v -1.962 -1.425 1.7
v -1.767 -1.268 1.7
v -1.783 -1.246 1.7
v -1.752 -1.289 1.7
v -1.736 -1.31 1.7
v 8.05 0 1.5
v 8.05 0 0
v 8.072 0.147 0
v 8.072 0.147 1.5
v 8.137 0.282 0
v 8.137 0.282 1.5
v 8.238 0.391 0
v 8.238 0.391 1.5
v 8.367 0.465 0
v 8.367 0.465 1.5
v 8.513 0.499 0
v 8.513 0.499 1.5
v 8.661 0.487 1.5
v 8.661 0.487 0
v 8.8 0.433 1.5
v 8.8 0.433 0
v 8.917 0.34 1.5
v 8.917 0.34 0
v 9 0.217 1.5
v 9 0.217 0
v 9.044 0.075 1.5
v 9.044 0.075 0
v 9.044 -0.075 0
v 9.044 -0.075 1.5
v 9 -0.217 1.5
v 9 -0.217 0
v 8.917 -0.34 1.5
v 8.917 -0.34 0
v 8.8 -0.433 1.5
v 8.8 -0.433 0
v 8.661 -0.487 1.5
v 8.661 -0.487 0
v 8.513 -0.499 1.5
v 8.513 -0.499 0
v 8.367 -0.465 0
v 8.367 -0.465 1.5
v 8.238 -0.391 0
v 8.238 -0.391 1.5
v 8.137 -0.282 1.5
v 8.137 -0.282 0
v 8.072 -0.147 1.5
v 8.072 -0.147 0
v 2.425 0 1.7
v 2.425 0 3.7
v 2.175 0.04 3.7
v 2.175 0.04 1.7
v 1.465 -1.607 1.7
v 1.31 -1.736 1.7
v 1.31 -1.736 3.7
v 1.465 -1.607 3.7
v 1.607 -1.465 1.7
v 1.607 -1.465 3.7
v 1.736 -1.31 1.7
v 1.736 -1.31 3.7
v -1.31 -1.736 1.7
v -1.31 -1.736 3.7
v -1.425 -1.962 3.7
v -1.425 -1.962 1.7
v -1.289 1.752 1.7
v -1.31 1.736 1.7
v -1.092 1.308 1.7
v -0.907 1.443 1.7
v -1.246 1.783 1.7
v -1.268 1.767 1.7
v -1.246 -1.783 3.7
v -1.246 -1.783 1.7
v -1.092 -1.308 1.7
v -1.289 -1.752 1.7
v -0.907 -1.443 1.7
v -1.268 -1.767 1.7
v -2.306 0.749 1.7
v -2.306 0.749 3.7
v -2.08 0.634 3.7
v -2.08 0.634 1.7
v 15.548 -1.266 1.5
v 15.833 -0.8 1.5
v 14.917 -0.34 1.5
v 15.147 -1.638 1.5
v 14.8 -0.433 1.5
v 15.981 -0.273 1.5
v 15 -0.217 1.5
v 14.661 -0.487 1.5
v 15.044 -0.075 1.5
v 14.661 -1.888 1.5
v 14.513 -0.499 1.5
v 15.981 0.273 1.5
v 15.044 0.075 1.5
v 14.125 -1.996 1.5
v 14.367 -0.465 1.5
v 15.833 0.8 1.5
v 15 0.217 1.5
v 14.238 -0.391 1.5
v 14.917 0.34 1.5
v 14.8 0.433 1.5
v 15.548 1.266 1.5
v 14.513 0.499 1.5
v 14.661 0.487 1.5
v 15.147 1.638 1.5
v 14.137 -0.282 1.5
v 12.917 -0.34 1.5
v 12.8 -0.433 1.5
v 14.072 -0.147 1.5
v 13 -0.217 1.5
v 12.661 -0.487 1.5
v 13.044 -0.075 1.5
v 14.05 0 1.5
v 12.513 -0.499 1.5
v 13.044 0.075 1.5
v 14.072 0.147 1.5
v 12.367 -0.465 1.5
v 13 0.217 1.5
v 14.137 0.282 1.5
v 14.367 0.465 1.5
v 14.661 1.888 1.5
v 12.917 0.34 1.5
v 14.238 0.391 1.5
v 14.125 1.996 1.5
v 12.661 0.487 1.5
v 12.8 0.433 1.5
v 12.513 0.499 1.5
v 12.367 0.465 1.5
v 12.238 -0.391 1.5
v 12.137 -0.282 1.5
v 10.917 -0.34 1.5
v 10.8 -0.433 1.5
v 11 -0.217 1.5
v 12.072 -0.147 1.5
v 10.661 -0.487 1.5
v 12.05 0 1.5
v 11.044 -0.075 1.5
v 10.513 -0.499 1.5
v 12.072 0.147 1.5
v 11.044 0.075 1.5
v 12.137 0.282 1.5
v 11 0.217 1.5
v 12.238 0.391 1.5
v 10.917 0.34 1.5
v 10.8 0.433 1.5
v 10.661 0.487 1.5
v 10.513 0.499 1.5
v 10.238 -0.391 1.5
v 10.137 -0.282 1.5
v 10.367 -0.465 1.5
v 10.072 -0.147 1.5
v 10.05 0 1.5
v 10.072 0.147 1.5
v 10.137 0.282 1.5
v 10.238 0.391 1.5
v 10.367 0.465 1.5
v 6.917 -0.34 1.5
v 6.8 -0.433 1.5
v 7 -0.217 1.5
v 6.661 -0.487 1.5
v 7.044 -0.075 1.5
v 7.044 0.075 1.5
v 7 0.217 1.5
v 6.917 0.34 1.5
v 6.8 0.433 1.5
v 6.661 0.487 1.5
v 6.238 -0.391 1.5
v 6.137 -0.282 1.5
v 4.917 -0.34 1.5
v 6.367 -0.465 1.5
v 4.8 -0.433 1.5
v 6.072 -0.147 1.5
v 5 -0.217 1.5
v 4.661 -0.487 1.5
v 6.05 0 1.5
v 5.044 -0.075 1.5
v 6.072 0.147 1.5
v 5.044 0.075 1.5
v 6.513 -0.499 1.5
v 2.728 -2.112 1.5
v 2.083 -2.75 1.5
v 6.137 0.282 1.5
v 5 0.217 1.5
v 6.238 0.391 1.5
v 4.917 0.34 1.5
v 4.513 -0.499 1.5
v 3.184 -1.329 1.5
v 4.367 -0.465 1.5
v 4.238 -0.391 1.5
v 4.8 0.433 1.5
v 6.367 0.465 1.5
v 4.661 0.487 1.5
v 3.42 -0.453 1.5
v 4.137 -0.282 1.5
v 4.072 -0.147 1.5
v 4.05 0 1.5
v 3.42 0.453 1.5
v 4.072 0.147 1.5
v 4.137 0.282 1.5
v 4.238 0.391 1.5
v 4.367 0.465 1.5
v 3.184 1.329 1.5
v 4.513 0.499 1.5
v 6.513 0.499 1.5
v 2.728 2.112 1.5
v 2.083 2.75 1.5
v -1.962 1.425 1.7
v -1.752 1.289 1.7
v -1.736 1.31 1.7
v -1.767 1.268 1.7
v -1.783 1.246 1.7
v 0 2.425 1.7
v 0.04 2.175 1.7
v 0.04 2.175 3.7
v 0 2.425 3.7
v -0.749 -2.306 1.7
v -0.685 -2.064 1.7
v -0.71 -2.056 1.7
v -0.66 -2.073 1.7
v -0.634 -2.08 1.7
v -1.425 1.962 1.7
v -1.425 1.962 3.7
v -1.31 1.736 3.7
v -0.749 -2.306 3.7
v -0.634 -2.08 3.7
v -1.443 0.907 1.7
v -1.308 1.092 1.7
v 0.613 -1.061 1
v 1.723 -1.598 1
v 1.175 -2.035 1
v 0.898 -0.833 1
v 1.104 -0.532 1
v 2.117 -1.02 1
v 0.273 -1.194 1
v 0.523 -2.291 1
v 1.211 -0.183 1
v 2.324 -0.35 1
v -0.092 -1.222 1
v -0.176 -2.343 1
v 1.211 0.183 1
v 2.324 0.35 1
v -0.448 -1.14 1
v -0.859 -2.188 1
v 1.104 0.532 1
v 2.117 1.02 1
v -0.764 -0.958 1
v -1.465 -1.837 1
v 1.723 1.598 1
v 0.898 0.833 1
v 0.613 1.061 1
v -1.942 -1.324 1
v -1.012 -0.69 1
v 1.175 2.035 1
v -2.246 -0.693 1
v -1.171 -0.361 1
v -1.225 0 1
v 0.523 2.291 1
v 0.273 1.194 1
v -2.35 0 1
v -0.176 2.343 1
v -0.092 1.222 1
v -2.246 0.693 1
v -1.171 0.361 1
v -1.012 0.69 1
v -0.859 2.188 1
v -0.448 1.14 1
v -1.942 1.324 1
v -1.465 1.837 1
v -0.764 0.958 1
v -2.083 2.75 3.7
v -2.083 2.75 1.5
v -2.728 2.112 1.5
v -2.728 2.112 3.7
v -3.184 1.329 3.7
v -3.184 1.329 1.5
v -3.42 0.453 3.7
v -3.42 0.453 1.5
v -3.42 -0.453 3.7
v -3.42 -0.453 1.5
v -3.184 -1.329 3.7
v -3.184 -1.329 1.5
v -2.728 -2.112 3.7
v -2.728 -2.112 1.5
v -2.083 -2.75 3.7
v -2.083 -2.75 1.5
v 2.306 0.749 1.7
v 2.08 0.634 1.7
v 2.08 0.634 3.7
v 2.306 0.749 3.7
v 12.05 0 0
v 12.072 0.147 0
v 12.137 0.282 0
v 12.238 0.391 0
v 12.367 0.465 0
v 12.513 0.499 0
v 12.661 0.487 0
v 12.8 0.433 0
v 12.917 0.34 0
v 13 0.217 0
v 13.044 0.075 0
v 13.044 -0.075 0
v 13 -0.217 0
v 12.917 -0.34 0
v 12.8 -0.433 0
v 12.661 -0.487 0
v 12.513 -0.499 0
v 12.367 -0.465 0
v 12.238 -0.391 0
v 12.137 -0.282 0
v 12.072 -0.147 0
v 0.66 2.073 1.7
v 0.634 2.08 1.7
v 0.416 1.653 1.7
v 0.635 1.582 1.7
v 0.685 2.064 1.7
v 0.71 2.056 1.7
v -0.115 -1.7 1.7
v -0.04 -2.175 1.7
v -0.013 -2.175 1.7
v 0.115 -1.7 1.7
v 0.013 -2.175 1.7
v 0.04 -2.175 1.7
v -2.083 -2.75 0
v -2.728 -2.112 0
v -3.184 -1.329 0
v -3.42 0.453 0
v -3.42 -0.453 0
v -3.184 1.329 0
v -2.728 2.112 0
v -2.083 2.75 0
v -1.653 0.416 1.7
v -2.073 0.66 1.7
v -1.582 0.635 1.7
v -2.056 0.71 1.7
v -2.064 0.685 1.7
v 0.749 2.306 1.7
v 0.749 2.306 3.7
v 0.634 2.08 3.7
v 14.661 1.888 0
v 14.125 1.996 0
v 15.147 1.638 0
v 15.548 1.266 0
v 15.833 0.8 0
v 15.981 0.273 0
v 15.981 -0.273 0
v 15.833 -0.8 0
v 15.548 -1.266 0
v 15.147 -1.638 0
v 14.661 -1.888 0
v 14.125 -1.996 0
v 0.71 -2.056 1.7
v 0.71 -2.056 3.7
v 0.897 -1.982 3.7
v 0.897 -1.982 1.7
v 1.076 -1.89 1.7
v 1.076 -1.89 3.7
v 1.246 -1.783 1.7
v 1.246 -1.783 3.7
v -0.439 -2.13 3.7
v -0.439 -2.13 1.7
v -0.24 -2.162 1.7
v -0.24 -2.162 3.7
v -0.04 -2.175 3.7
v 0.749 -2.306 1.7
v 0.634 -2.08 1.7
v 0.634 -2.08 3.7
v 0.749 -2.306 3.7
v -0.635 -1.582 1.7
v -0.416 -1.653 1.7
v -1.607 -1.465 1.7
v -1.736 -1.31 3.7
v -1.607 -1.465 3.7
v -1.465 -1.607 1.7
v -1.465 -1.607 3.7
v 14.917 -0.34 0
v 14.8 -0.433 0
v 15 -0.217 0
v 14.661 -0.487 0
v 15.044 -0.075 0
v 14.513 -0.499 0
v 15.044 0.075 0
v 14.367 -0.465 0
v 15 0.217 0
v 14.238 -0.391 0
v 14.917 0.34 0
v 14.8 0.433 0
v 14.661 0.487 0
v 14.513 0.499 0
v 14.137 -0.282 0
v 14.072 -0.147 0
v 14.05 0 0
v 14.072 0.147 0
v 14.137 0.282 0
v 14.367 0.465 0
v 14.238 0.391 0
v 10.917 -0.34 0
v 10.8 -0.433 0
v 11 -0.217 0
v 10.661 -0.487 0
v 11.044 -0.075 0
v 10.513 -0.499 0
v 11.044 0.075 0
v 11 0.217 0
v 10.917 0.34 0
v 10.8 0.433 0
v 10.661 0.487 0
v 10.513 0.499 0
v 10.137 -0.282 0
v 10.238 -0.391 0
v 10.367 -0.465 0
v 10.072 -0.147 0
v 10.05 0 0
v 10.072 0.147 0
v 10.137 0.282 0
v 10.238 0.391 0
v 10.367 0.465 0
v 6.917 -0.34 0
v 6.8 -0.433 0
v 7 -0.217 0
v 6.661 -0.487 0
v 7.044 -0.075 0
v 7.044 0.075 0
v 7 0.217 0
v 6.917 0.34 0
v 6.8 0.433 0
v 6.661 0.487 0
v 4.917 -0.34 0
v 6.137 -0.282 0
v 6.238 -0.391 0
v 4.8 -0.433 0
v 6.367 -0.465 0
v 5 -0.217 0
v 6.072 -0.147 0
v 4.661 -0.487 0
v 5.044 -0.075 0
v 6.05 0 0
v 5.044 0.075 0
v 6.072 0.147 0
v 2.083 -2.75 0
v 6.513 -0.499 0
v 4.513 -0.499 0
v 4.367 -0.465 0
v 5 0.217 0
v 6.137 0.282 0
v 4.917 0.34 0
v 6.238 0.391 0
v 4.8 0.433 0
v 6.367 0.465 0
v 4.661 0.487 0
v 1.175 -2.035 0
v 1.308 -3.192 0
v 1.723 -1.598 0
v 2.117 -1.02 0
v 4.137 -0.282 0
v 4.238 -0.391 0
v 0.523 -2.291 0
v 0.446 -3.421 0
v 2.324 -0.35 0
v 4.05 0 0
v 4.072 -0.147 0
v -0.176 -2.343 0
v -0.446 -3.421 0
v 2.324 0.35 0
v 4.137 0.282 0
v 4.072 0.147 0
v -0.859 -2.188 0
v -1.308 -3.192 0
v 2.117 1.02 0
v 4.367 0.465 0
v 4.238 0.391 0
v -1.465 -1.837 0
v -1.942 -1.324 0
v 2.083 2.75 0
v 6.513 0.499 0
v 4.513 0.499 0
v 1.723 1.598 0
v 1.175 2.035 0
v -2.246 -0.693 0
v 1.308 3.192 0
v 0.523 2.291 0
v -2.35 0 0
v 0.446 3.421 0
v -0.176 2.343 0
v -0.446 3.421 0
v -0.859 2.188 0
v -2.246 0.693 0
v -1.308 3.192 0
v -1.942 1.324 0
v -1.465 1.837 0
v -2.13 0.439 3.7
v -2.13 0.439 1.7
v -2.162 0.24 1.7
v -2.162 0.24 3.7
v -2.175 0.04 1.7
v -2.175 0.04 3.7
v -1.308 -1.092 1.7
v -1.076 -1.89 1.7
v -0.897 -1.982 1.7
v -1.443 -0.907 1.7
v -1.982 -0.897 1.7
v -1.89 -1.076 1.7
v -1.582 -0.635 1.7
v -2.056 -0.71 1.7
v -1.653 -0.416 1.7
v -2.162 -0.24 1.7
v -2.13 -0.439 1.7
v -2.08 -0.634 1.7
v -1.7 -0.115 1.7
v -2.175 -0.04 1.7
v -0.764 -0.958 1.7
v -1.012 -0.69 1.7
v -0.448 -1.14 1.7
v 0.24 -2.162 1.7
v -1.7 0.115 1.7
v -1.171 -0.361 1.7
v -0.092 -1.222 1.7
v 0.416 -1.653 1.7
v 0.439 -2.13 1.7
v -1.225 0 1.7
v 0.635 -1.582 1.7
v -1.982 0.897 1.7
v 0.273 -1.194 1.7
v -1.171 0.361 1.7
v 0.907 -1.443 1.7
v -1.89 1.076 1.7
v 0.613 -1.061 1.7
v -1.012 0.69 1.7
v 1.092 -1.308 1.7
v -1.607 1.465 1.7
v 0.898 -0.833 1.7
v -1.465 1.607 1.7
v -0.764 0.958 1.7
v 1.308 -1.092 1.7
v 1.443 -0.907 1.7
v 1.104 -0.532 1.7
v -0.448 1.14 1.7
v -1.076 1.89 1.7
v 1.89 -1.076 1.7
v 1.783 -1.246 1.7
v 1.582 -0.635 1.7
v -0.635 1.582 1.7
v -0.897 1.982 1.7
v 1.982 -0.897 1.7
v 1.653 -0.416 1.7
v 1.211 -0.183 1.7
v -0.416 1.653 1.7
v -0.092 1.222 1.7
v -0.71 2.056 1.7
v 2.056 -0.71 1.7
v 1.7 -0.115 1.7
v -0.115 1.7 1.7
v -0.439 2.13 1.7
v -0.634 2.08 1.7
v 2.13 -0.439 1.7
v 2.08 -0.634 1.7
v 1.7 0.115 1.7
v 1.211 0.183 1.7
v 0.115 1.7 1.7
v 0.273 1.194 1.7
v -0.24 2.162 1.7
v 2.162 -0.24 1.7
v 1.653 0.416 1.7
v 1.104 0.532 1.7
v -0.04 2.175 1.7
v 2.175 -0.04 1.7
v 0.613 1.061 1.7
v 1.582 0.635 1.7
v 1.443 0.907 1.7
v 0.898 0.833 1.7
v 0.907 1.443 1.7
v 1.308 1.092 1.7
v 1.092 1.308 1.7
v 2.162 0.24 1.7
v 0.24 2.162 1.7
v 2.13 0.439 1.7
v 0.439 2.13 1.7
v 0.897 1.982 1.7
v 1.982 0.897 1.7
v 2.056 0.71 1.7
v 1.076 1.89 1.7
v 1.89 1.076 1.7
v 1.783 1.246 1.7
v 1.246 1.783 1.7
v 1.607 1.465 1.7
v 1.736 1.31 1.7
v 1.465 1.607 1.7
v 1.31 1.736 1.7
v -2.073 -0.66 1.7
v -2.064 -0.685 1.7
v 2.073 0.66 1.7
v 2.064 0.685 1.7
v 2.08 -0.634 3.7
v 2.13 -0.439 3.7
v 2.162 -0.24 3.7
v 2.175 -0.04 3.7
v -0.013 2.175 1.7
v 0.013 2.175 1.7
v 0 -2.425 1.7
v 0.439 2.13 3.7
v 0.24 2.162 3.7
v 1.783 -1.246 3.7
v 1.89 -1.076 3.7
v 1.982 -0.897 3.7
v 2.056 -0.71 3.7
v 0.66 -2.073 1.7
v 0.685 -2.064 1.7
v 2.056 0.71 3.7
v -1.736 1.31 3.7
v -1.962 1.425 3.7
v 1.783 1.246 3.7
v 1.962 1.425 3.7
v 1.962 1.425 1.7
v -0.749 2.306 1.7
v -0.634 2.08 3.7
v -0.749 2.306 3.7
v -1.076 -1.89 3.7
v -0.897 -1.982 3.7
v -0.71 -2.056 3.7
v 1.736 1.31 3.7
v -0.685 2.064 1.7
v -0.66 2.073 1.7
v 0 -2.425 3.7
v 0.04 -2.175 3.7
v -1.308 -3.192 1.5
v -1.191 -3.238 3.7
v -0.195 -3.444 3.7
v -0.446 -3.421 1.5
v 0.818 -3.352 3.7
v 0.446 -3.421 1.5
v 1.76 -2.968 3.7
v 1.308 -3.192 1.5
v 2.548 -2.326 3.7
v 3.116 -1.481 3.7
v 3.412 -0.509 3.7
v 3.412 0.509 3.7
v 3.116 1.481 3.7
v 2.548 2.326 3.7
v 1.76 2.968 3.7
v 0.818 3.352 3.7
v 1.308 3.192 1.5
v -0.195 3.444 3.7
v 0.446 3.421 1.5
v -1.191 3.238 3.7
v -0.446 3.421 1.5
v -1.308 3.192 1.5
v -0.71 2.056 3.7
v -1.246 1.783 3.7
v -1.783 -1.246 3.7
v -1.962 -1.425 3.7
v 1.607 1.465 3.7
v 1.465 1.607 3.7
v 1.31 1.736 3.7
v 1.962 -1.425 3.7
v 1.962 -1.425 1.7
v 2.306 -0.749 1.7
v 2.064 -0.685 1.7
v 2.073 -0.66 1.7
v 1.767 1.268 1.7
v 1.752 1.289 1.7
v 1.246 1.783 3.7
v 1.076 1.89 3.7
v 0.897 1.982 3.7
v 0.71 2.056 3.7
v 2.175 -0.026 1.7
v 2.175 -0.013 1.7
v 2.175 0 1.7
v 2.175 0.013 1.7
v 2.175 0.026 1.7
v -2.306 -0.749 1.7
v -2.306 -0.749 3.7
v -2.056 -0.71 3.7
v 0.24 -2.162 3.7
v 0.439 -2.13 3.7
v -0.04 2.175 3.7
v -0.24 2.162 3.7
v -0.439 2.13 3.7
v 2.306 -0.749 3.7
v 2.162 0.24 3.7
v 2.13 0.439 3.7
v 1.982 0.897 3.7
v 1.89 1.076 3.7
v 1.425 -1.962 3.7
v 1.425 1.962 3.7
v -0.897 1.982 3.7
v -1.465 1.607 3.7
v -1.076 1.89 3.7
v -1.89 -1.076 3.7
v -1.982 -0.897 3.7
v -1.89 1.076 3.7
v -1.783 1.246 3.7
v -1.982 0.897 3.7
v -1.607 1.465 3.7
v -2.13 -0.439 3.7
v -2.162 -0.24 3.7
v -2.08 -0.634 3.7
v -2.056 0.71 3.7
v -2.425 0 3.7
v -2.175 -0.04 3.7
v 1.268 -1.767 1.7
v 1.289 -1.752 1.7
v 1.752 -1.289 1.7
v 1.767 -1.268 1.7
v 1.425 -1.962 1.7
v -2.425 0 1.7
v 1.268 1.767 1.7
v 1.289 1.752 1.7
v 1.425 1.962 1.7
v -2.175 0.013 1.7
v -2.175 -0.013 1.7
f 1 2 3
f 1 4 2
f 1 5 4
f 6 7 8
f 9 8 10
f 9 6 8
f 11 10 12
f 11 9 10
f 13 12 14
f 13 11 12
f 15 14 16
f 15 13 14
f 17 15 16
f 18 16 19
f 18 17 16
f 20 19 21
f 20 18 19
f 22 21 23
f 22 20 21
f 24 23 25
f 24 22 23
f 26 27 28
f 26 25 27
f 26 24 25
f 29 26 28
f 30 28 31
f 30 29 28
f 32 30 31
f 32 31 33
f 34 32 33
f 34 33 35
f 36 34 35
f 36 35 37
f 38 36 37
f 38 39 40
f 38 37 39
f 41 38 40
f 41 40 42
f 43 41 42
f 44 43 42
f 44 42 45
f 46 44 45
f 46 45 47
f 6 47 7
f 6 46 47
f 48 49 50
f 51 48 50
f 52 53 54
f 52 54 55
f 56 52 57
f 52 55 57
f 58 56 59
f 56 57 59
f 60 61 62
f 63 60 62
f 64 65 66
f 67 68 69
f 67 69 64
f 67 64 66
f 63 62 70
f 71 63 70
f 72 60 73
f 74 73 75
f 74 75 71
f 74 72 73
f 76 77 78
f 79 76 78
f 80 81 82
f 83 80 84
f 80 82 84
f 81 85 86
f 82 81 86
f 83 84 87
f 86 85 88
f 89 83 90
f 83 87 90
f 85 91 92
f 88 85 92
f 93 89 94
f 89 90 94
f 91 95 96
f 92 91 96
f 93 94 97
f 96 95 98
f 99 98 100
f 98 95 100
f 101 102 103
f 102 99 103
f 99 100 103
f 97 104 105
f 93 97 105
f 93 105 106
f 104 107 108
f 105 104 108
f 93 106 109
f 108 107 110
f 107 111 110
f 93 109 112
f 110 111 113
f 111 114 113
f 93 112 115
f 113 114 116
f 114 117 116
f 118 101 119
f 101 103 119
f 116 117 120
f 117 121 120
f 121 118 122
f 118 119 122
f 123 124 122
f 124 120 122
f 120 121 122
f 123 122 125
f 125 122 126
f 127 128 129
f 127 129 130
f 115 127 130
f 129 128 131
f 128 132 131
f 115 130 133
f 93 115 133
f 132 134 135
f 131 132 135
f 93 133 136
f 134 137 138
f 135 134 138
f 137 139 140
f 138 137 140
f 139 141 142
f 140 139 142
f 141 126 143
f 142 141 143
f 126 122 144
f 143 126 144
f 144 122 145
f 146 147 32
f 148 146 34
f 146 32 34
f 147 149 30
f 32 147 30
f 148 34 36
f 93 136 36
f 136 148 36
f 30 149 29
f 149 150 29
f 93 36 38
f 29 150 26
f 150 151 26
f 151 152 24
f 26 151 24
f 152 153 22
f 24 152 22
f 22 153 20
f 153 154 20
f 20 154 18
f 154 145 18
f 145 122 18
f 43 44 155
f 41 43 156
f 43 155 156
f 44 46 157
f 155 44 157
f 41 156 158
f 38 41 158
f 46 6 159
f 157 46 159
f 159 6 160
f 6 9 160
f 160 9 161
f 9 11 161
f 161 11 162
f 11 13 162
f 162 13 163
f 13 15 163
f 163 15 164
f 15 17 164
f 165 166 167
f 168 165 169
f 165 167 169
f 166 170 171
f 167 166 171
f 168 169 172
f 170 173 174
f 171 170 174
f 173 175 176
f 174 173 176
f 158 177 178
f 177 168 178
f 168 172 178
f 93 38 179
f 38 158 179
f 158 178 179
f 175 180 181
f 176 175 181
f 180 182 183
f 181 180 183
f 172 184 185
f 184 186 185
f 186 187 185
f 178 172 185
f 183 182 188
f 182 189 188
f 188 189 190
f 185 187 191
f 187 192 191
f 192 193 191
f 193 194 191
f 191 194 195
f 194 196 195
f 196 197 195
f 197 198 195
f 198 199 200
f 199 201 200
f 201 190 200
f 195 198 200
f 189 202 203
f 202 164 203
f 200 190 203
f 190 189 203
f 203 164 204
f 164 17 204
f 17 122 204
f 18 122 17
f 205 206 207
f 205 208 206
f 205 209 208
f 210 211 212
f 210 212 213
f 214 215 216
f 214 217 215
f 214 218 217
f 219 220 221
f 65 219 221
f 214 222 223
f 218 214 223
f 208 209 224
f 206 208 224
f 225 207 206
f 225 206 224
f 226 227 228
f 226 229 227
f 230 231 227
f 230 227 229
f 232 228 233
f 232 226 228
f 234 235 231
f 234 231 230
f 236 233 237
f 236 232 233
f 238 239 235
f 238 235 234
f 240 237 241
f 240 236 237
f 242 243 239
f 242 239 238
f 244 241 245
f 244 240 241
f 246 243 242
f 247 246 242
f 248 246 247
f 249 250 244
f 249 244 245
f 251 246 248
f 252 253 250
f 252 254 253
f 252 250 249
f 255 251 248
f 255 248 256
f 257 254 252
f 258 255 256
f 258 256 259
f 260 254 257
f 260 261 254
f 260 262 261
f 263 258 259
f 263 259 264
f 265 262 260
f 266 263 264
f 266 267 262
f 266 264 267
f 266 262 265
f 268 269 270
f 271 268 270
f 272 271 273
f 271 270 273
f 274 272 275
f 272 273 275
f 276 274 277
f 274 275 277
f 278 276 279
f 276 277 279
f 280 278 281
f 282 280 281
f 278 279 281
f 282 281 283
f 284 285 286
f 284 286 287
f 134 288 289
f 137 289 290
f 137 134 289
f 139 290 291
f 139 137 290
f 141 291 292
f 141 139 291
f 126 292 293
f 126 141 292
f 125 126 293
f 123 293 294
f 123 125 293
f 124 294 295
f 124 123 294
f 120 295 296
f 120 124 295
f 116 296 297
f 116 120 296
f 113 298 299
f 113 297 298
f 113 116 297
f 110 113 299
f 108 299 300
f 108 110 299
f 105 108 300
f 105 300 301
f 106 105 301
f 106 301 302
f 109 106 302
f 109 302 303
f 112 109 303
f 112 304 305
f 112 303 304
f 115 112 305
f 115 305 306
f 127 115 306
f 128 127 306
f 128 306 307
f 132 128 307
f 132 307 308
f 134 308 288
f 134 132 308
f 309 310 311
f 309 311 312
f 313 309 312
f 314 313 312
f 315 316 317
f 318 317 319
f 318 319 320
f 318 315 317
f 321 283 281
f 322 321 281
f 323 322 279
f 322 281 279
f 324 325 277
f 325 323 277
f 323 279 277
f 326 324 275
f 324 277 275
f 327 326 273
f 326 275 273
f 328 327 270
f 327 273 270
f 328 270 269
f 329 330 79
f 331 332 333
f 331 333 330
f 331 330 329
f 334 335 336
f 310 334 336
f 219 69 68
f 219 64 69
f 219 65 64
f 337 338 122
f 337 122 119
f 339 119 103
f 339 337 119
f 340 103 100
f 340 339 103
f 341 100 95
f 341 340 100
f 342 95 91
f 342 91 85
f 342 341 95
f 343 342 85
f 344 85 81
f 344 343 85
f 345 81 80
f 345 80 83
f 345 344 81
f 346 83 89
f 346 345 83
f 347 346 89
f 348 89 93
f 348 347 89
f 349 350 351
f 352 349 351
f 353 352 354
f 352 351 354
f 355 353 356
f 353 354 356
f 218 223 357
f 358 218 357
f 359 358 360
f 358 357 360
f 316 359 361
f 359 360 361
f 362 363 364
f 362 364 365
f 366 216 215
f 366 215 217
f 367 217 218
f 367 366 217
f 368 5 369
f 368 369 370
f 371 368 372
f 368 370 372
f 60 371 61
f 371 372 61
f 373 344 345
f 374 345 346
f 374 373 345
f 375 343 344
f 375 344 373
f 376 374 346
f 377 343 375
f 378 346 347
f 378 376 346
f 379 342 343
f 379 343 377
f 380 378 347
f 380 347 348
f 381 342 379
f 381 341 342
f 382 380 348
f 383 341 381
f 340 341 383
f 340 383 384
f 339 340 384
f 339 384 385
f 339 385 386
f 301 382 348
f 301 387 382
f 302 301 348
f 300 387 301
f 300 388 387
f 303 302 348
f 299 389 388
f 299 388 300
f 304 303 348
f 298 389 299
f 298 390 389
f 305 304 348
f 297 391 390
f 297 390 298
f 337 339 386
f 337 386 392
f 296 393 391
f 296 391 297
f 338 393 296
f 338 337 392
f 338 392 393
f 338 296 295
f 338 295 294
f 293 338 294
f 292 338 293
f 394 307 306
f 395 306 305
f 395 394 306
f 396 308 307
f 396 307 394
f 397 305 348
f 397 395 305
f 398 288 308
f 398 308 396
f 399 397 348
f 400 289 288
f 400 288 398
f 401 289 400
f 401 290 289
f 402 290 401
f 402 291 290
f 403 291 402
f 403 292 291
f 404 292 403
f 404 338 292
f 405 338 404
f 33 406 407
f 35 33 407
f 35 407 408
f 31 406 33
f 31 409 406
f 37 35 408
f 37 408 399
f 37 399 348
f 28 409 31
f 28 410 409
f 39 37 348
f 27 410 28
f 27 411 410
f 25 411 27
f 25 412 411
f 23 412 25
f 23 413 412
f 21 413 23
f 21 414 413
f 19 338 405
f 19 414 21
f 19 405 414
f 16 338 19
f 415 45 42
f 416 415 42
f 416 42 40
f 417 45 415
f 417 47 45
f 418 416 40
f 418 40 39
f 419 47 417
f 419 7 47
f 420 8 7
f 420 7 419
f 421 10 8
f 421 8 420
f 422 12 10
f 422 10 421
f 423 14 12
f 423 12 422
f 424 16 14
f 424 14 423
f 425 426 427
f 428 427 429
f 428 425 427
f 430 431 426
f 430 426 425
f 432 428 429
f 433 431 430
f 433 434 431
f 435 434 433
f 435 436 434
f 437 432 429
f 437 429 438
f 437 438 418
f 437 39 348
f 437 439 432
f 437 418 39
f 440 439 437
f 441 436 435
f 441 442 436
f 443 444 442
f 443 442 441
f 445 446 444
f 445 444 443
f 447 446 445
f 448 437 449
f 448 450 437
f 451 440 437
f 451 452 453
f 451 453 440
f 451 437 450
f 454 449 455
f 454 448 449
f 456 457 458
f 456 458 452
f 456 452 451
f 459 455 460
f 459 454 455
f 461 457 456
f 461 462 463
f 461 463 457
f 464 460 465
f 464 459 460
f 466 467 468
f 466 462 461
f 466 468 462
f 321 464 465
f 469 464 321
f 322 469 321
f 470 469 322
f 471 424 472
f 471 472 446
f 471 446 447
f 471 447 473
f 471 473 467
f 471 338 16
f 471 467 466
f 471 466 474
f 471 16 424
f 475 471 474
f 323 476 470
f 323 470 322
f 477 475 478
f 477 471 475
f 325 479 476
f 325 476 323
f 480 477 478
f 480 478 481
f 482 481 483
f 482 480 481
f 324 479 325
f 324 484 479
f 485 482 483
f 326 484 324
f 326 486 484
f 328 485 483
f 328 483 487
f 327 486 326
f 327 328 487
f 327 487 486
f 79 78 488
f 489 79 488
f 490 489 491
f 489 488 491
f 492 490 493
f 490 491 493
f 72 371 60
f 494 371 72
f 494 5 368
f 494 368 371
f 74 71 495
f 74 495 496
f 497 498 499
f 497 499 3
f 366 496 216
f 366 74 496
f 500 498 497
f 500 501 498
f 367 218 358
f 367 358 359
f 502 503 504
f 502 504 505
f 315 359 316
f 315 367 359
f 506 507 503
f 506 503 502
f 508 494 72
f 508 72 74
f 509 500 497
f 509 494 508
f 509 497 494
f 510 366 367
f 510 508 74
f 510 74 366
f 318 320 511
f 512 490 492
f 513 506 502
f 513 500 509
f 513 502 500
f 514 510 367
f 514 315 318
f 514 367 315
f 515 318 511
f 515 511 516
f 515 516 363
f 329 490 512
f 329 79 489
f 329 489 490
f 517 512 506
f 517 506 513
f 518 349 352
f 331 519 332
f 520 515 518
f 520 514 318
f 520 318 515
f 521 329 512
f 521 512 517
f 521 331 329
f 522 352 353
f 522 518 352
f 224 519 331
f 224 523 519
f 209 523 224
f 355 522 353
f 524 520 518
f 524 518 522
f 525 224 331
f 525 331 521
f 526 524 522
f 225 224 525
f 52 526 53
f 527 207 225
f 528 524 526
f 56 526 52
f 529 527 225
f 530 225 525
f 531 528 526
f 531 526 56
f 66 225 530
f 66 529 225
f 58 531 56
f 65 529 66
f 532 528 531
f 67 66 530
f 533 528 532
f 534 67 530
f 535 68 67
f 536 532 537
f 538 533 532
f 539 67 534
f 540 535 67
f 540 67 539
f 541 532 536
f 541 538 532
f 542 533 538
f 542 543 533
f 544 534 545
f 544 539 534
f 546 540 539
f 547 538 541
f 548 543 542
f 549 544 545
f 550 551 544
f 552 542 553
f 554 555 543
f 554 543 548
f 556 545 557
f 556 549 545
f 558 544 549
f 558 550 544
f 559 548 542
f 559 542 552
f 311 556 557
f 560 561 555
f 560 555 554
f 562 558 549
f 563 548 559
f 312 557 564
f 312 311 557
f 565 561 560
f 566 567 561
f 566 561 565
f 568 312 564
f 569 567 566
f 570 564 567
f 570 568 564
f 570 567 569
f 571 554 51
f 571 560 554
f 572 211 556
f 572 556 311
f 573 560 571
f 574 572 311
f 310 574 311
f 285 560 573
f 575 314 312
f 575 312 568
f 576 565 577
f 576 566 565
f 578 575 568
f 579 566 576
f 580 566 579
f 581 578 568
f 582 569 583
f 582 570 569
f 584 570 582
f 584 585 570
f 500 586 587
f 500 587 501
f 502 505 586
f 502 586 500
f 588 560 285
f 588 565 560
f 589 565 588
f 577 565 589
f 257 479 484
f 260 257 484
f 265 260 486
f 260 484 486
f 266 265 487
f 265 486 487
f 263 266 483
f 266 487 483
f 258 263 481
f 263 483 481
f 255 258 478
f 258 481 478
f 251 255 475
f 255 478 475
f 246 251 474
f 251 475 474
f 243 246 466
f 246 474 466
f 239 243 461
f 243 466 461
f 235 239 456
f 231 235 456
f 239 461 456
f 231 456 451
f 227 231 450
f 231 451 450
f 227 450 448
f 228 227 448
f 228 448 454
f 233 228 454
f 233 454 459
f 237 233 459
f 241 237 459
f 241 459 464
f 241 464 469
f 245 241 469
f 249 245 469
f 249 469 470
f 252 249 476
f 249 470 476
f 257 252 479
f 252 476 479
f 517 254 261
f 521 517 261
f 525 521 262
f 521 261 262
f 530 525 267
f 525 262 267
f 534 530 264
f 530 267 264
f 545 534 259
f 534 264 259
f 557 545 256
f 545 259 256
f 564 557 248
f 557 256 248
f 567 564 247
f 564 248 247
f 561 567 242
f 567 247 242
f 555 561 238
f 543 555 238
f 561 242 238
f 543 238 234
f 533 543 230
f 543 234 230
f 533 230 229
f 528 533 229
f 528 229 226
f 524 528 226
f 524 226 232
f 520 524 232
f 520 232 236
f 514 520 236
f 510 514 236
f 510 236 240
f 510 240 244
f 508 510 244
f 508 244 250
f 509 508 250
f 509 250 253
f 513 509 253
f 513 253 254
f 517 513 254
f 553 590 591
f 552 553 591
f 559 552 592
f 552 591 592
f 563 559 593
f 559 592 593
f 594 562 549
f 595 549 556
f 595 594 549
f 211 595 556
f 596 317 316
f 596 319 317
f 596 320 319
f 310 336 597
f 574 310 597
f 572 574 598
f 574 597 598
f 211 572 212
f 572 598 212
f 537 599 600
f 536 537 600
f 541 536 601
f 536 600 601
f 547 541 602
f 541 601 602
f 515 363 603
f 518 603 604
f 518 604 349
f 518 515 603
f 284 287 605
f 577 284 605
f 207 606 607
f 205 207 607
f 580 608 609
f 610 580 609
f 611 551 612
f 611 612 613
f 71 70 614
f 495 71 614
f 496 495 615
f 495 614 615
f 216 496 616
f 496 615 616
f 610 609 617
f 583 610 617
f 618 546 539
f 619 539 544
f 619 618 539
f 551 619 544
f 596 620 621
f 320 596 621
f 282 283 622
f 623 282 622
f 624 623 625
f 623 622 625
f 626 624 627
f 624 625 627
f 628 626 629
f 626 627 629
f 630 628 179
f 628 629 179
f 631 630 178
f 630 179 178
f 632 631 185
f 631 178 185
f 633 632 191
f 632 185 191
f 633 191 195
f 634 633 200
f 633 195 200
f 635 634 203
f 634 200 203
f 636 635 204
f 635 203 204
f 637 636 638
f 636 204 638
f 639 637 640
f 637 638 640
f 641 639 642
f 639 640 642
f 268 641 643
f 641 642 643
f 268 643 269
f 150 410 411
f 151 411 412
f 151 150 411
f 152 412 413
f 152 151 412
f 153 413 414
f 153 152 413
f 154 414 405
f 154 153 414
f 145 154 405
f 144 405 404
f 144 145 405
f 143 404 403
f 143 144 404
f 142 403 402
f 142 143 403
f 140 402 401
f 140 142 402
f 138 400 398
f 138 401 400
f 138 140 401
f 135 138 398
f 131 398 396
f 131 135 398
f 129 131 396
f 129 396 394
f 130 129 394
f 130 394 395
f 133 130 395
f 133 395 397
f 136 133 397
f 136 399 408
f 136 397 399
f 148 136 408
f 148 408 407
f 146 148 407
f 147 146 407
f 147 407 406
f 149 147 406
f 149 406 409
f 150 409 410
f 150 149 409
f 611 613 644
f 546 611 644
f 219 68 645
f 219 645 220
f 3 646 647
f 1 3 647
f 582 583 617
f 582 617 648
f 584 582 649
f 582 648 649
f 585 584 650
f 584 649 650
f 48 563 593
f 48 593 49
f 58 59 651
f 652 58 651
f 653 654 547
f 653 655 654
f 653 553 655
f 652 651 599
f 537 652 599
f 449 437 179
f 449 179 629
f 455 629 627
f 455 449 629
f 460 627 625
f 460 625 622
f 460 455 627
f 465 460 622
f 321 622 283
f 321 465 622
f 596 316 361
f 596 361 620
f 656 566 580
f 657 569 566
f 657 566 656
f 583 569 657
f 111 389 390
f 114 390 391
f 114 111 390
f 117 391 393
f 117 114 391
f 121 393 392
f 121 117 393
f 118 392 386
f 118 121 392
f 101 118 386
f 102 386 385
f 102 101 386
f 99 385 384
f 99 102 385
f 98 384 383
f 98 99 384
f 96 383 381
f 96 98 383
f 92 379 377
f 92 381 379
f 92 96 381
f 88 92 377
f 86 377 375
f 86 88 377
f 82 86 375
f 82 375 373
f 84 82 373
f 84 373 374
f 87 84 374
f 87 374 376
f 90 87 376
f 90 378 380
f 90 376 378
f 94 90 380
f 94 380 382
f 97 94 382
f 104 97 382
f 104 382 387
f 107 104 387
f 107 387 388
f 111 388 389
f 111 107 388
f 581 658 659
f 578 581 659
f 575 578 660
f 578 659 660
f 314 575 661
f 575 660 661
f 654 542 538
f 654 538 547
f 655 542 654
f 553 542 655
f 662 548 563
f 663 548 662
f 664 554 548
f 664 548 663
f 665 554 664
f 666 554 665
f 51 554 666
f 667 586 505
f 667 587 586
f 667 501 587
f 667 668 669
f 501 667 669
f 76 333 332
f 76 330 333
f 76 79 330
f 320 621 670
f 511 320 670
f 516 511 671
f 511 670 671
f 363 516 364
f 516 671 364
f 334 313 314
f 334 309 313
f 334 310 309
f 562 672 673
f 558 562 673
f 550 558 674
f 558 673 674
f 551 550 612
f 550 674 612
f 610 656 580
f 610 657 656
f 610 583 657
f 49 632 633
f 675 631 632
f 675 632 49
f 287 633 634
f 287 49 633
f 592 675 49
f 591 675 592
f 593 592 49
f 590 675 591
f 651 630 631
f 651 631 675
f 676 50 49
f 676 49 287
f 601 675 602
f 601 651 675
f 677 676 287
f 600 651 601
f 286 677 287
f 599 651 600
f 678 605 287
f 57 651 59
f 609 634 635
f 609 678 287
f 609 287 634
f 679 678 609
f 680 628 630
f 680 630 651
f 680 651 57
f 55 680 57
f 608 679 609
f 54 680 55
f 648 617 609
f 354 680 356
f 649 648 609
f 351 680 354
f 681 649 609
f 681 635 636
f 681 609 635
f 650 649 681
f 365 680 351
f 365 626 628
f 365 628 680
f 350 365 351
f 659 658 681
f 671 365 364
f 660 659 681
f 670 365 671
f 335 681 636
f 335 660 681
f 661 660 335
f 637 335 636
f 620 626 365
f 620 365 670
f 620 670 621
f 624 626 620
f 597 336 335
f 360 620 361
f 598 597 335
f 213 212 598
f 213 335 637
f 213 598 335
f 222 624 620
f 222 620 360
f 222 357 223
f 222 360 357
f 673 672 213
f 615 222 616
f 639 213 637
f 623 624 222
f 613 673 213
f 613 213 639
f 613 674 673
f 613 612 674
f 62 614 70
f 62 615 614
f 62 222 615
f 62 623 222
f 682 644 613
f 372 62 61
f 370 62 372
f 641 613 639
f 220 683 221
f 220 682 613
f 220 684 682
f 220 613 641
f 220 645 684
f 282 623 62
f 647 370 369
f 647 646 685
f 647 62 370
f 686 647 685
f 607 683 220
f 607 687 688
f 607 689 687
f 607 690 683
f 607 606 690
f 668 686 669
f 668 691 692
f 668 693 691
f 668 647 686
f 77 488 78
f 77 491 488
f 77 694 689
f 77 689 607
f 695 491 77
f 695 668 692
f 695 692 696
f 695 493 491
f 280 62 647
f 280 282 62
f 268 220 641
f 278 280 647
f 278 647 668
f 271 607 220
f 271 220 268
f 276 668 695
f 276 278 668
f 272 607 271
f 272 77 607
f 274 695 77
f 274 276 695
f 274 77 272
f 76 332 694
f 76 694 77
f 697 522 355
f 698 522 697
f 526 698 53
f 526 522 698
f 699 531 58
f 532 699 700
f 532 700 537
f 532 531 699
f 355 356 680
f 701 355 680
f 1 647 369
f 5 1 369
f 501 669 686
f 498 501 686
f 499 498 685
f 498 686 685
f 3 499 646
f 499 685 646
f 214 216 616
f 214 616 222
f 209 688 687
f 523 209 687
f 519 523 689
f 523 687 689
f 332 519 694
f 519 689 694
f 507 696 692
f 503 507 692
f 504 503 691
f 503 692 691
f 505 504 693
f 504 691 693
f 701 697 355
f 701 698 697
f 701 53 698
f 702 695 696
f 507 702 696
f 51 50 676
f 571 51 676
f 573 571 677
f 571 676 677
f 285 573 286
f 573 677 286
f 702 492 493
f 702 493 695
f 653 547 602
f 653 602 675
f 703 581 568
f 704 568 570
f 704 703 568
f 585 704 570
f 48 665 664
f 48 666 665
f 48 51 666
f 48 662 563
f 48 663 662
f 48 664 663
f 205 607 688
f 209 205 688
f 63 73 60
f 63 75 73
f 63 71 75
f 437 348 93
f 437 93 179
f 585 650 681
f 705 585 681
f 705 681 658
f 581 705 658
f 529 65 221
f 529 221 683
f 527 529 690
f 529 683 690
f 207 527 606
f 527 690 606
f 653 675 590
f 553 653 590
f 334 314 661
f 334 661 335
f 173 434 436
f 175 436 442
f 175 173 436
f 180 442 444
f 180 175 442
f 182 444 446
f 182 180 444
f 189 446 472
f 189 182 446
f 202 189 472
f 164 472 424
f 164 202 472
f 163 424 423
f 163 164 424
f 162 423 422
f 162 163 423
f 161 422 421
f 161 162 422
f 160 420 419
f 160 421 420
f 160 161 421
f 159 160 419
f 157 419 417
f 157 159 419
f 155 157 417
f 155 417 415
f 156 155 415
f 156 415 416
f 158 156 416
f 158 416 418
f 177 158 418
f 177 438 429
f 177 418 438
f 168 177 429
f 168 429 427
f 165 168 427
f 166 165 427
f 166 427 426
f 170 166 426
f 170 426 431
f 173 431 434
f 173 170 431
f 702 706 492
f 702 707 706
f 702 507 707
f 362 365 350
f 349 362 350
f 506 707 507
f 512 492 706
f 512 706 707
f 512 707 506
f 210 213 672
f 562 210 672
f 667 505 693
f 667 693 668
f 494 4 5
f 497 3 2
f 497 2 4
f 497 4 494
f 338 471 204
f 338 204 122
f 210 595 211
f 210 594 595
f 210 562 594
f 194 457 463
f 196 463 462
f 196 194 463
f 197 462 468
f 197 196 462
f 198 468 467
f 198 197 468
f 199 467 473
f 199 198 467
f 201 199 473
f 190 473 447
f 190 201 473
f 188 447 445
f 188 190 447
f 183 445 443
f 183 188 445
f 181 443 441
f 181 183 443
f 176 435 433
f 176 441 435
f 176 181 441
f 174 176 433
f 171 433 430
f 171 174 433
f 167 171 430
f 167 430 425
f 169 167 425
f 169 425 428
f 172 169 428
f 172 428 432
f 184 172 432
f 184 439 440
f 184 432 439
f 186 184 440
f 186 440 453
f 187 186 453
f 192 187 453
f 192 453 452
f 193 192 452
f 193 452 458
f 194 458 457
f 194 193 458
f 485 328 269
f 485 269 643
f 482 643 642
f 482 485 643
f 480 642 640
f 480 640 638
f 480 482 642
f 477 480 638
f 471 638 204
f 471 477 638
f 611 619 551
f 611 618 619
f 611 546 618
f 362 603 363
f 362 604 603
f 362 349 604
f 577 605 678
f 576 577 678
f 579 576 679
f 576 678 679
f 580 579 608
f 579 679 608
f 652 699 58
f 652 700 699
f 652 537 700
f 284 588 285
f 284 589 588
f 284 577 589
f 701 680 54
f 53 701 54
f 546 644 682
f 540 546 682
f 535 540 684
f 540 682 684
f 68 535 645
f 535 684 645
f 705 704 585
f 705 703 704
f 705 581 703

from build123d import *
from build123d.topology import SkipClean

# Parameters (mm, degrees)
EXTRUDE_1_DEPTH          = 1.5
SKETCH_2_R               = 3.45
EXTRUDE_2_DEPTH          = 2.2
SKETCH_4_R               = 1.225
CUT_EXTRUDE_2_DEPTH      = 17.780718101
SKETCH_3_R               = 2.175
CUT_EXTRUDE_1_DEPTH      = 2
CUT_EXTRUDE_3_DEPTH      = 2
PATTERN_CIRCULAR_1_COUNT = 20
SKETCH_6_R               = 2.35
CUT_EXTRUDE_4_DEPTH      = 1
SKETCH_7_R               = 0.5
CUT_EXTRUDE_5_DEPTH      = 17.514917499
CUT_EXTRUDE_6_DEPTH      = 17.780718101


with BuildPart() as part:
    # 草图1 → 凸台-拉伸1 (new body)
    with BuildSketch(Plane.XY):
        with BuildLine():
            Line((-14.124971514, 1.996091711), (-2.083266666, 2.75))
            ThreePointArc((-2.083266666, 2.75), (0, 3.45), (2.083266666, 2.75))
            Line((2.083266666, 2.75), (14.124971514, 1.996091711))
            ThreePointArc((14.124971514, 1.996091711), (16, 0), (14.124971514, -1.996091711))
            Line((14.124971514, -1.996091711), (2.083266666, -2.75))
            ThreePointArc((2.083266666, -2.75), (0, -3.45), (-2.083266666, -2.75))
            Line((-2.083266666, -2.75), (-14.124971514, -1.996091711))
            ThreePointArc((-14.124971514, -1.996091711), (-16, 0), (-14.124971514, 1.996091711))
        make_face()
    extrude(amount=EXTRUDE_1_DEPTH)

    # 草图2 → 凸台-拉伸2 (add)
    with SkipClean():  # the faces are left unmerged after this step: merging them gives an invalid solid
        with BuildSketch(Plane.XY.offset(1.5)):
            with Locations(Location((0, 0, 0), (0, 0, 127.145804172))):
                Circle(SKETCH_2_R)
        extrude(amount=EXTRUDE_2_DEPTH)

    # 草图4 → 切除-拉伸2 (cut, through all)
    with SkipClean():  # the faces are left unmerged after this step: merging them gives an invalid solid
        with BuildSketch(Plane(origin=(0, 0, 0), x_dir=(-1, 0, 0), z_dir=(0, 0, -1))):
            Circle(SKETCH_4_R)
        extrude(amount=-CUT_EXTRUDE_2_DEPTH, mode=Mode.SUBTRACT)

    # 草图3 → 切除-拉伸1 (cut)
    with SkipClean():  # the faces are left unmerged after this step: merging them gives an invalid solid
        with BuildSketch(Plane.XY.offset(3.7)):
            Circle(SKETCH_3_R)
        extrude(amount=-CUT_EXTRUDE_1_DEPTH, mode=Mode.SUBTRACT)

    # 草图5 → 切除-拉伸3 (cut)
    with SkipClean():  # the faces are left unmerged after this step: merging them gives an invalid solid
        with BuildSketch(Plane.XY.offset(3.7)):
            Polygon((2.425, 0), (1.700332145, 0.114776113), (1.700332145, -0.114776113), align=None)
        cut_extrude_3 = extrude(amount=-CUT_EXTRUDE_3_DEPTH, mode=Mode.SUBTRACT)

    # 阵列(圆周)1: 切除-拉伸3 ×20 about axis
    with SkipClean():  # the faces are left unmerged after this step: merging them gives an invalid solid
        pattern_circular_1_axis = Axis((0, 0, 0), (0, 0, 1))
        for i in range(1, PATTERN_CIRCULAR_1_COUNT):
            add(cut_extrude_3.rotate(pattern_circular_1_axis, i * 360 / PATTERN_CIRCULAR_1_COUNT), mode=Mode.SUBTRACT)

    # 草图6 → 切除-拉伸4 (cut)
    with SkipClean():  # the faces are left unmerged after this step: merging them gives an invalid solid
        with BuildSketch(Plane(origin=(0, 0, 0), x_dir=(-1, 0, 0), z_dir=(0, 0, -1))):
            Circle(SKETCH_6_R)
        extrude(amount=-CUT_EXTRUDE_4_DEPTH, mode=Mode.SUBTRACT)

    # 草图7 → 切除-拉伸5 (cut, through all)
    with SkipClean():  # the faces are left unmerged after this step: merging them gives an invalid solid
        with BuildSketch(Plane.XY.offset(1.5)):
            with Locations((-4.55, 0)):
                Circle(SKETCH_7_R)
            with Locations((-6.55, 0)):
                Circle(SKETCH_7_R)
            with Locations((-8.55, 0)):
                Circle(SKETCH_7_R)
            with Locations((-10.55, 0)):
                Circle(SKETCH_7_R)
            with Locations((-12.55, 0)):
                Circle(SKETCH_7_R)
            with Locations((-14.55, 0)):
                Circle(SKETCH_7_R)
        cut_extrude_5 = extrude(amount=-CUT_EXTRUDE_5_DEPTH, mode=Mode.SUBTRACT)

    # 镜向1: 切除-拉伸5 across plane
    with SkipClean():  # the faces are left unmerged after this step: merging them gives an invalid solid
        add(cut_extrude_5.mirror(Plane(origin=(0, 0, 0), x_dir=(0, 0, 1), z_dir=(1, 0, 0))), mode=Mode.SUBTRACT)

    # 草图8 → 切除-拉伸6 (cut, through all)
    with SkipClean():  # the faces are left unmerged after this step: merging them gives an invalid solid
        with BuildSketch(Plane.XY.offset(3.7)):
            with BuildLine():
                Line((-2.083266666, 2.75), (-16, 2.75))
                Line((-16, 2.75), (-16, -2.75))
                Line((-16, -2.75), (-2.083266666, -2.75))
                ThreePointArc((-2.083266666, -2.75), (-3.45, 0), (-2.083266666, 2.75))
            make_face()
        extrude(amount=-CUT_EXTRUDE_6_DEPTH, mode=Mode.SUBTRACT)


solid = part.part
